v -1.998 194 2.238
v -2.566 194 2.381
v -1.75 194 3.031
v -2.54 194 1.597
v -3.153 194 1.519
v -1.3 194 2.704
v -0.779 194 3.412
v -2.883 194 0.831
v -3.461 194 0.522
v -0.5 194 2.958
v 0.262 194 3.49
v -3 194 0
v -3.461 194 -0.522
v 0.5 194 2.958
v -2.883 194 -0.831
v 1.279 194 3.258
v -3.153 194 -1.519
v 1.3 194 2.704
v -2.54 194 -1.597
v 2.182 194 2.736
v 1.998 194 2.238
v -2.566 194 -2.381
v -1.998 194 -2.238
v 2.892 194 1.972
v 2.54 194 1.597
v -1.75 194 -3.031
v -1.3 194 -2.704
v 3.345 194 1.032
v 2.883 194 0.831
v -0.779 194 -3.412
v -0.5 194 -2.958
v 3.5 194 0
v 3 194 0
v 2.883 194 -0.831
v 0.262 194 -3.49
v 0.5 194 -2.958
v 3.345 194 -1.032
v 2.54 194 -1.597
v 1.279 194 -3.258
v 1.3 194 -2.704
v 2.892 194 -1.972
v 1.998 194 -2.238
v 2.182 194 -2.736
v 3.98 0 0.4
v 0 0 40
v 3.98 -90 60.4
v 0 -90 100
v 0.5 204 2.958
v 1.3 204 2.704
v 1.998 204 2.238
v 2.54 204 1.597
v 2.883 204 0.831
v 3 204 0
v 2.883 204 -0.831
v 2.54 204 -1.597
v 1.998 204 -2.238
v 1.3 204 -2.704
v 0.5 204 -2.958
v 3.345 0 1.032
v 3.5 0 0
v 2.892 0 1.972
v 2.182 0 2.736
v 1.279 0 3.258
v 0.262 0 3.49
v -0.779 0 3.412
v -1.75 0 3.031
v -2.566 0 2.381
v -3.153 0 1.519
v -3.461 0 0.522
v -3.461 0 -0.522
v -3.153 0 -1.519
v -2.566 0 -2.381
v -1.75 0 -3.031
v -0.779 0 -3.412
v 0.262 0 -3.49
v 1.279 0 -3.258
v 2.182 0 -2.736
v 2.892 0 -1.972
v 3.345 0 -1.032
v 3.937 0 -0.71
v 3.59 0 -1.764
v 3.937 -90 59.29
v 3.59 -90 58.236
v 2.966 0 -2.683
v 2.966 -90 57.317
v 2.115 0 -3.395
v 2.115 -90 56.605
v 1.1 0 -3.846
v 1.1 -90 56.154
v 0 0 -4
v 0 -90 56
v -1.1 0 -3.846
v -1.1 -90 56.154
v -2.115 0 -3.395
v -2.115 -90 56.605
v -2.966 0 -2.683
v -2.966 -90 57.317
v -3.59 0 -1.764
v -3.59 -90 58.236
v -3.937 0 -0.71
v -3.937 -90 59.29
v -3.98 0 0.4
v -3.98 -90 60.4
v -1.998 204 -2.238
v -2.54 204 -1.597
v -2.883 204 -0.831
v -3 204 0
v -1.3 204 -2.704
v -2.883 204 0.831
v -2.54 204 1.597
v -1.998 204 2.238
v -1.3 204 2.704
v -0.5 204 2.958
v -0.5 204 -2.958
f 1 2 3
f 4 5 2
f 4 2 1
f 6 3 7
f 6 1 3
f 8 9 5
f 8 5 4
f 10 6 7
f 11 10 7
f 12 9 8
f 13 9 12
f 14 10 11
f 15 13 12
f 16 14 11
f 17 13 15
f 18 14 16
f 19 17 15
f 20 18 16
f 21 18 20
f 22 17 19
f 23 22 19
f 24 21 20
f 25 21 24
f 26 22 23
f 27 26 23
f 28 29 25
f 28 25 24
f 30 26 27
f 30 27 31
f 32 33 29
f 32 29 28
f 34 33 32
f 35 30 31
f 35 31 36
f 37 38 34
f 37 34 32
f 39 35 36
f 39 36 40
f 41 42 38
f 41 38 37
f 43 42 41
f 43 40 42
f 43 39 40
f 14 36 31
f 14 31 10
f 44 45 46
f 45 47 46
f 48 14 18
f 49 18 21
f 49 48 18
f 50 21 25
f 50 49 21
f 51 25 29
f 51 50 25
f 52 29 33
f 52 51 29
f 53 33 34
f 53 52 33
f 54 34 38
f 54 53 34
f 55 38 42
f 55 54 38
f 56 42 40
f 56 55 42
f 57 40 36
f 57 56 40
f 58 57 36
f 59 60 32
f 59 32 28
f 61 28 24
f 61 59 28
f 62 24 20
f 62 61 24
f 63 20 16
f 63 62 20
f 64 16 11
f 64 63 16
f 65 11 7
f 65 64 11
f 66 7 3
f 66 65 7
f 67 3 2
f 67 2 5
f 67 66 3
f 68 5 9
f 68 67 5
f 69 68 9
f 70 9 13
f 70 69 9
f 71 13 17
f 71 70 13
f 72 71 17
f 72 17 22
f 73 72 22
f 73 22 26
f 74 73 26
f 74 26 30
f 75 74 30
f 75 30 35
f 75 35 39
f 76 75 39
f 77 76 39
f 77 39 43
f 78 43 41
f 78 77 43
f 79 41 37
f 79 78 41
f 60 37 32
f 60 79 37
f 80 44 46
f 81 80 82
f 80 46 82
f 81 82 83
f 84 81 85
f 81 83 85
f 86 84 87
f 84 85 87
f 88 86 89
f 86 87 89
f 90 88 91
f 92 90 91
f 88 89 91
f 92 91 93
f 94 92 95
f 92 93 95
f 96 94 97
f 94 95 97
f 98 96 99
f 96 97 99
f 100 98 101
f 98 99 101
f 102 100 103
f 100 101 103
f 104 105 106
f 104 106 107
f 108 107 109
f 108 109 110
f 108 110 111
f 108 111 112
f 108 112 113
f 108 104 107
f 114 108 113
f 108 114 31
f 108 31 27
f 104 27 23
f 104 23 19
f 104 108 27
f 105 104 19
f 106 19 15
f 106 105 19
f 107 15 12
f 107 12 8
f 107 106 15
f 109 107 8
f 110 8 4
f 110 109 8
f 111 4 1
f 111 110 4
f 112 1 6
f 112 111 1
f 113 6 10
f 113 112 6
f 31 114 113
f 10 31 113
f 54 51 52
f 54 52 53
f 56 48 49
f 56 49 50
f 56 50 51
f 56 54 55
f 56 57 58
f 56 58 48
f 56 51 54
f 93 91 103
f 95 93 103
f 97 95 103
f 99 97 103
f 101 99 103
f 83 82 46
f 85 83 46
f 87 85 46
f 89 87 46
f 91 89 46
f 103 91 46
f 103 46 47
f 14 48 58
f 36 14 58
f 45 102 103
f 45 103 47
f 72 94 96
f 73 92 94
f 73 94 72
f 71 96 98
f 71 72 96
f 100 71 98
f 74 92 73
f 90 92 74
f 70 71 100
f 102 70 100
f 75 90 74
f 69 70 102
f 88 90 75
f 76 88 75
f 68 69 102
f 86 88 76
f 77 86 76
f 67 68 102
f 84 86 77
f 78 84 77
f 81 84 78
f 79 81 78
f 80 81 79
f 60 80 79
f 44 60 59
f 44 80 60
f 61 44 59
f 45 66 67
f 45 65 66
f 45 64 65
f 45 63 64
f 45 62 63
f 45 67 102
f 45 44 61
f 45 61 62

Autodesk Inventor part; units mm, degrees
ref_plane "YZ Plane" through (0, 0, 0) normal (1, 0, 0) x (0, 1, 0)
ref_plane "XZ Plane" through (0, 0, 0) normal (0, 1, 0) x (-1, 0, 0)
ref_plane "XY Plane" through (0, 0, 0) normal (0, 0, 1) x (1, 0, 0)
sketch "Sketch1" plane through (0, 0, 0) normal (0, 1, 0) x (-1, 0, 0)
  arc A0 (-3.9799, 0.4) -> (3.9799, 0.4) centre (0, 0) ccw
  line L0 (-3.9799, 0.4) -> (0, 40)
  line L1 (0, 40) -> (3.9799, 0.4)
  dimension "d0" = 4
  dimension "d1" = 40
sketch "Sketch2" plane through (0, 0, 0) normal (1, 0, 0) x (0, 1, 0)
  line L0 (0, 0) -> (-90, 60)
  dimension "d2" = 90
  dimension "d3" = 60
sweep "Sweep1" add profiles "Sketch1" path "Sketch2"
sketch "Sketch3" plane through (0, 0, 0) normal (0, 1, 0) x (1, 0, 0)
  circle A0 centre (0, 0) radius 3.5
  dimension "d6" = 7
extrude "Extrusion1" add sketch "Sketch3" along normal blind 204
sketch "Sketch4" plane through (0, 204, 0) normal (0, 1, 0) x (1, 0, 0)
  circle A0 centre (0, 0) radius 3
  circle A1 centre (0, 0) radius 5
  line L0 (-0.5, -5) -> (0.5, -5)
  line L1 (0.5, -5) -> (0.5, 5)
  line L2 (0.5, 5) -> (-0.5, 5)
  line L3 (-0.5, 5) -> (-0.5, -5)
  line L4 (-0.5, -5) -> (0.5, 5) construction
  line L5 (0.5, -5) -> (-0.5, 5) construction
  point P0 (-0.5, -2.958)
  point P1 (-0.5, 2.958)
  point P2 (0.5, 2.958)
  point P3 (0.5, -2.958)
  dimension "d9" = 6
  dimension "d10" = 10
  dimension "d11" = 1
  dimension "d12" = 10
extrude "Extrusion2" cut sketch "Sketch4" against normal blind 10 contours A0 L1 A1 | L1 A0 L3 | A0 L3 A1 L1 | L1 A1 L3 A0 | A0 L3 A1
thread "Thread1"
properties part number "rudder_pair_queens"
